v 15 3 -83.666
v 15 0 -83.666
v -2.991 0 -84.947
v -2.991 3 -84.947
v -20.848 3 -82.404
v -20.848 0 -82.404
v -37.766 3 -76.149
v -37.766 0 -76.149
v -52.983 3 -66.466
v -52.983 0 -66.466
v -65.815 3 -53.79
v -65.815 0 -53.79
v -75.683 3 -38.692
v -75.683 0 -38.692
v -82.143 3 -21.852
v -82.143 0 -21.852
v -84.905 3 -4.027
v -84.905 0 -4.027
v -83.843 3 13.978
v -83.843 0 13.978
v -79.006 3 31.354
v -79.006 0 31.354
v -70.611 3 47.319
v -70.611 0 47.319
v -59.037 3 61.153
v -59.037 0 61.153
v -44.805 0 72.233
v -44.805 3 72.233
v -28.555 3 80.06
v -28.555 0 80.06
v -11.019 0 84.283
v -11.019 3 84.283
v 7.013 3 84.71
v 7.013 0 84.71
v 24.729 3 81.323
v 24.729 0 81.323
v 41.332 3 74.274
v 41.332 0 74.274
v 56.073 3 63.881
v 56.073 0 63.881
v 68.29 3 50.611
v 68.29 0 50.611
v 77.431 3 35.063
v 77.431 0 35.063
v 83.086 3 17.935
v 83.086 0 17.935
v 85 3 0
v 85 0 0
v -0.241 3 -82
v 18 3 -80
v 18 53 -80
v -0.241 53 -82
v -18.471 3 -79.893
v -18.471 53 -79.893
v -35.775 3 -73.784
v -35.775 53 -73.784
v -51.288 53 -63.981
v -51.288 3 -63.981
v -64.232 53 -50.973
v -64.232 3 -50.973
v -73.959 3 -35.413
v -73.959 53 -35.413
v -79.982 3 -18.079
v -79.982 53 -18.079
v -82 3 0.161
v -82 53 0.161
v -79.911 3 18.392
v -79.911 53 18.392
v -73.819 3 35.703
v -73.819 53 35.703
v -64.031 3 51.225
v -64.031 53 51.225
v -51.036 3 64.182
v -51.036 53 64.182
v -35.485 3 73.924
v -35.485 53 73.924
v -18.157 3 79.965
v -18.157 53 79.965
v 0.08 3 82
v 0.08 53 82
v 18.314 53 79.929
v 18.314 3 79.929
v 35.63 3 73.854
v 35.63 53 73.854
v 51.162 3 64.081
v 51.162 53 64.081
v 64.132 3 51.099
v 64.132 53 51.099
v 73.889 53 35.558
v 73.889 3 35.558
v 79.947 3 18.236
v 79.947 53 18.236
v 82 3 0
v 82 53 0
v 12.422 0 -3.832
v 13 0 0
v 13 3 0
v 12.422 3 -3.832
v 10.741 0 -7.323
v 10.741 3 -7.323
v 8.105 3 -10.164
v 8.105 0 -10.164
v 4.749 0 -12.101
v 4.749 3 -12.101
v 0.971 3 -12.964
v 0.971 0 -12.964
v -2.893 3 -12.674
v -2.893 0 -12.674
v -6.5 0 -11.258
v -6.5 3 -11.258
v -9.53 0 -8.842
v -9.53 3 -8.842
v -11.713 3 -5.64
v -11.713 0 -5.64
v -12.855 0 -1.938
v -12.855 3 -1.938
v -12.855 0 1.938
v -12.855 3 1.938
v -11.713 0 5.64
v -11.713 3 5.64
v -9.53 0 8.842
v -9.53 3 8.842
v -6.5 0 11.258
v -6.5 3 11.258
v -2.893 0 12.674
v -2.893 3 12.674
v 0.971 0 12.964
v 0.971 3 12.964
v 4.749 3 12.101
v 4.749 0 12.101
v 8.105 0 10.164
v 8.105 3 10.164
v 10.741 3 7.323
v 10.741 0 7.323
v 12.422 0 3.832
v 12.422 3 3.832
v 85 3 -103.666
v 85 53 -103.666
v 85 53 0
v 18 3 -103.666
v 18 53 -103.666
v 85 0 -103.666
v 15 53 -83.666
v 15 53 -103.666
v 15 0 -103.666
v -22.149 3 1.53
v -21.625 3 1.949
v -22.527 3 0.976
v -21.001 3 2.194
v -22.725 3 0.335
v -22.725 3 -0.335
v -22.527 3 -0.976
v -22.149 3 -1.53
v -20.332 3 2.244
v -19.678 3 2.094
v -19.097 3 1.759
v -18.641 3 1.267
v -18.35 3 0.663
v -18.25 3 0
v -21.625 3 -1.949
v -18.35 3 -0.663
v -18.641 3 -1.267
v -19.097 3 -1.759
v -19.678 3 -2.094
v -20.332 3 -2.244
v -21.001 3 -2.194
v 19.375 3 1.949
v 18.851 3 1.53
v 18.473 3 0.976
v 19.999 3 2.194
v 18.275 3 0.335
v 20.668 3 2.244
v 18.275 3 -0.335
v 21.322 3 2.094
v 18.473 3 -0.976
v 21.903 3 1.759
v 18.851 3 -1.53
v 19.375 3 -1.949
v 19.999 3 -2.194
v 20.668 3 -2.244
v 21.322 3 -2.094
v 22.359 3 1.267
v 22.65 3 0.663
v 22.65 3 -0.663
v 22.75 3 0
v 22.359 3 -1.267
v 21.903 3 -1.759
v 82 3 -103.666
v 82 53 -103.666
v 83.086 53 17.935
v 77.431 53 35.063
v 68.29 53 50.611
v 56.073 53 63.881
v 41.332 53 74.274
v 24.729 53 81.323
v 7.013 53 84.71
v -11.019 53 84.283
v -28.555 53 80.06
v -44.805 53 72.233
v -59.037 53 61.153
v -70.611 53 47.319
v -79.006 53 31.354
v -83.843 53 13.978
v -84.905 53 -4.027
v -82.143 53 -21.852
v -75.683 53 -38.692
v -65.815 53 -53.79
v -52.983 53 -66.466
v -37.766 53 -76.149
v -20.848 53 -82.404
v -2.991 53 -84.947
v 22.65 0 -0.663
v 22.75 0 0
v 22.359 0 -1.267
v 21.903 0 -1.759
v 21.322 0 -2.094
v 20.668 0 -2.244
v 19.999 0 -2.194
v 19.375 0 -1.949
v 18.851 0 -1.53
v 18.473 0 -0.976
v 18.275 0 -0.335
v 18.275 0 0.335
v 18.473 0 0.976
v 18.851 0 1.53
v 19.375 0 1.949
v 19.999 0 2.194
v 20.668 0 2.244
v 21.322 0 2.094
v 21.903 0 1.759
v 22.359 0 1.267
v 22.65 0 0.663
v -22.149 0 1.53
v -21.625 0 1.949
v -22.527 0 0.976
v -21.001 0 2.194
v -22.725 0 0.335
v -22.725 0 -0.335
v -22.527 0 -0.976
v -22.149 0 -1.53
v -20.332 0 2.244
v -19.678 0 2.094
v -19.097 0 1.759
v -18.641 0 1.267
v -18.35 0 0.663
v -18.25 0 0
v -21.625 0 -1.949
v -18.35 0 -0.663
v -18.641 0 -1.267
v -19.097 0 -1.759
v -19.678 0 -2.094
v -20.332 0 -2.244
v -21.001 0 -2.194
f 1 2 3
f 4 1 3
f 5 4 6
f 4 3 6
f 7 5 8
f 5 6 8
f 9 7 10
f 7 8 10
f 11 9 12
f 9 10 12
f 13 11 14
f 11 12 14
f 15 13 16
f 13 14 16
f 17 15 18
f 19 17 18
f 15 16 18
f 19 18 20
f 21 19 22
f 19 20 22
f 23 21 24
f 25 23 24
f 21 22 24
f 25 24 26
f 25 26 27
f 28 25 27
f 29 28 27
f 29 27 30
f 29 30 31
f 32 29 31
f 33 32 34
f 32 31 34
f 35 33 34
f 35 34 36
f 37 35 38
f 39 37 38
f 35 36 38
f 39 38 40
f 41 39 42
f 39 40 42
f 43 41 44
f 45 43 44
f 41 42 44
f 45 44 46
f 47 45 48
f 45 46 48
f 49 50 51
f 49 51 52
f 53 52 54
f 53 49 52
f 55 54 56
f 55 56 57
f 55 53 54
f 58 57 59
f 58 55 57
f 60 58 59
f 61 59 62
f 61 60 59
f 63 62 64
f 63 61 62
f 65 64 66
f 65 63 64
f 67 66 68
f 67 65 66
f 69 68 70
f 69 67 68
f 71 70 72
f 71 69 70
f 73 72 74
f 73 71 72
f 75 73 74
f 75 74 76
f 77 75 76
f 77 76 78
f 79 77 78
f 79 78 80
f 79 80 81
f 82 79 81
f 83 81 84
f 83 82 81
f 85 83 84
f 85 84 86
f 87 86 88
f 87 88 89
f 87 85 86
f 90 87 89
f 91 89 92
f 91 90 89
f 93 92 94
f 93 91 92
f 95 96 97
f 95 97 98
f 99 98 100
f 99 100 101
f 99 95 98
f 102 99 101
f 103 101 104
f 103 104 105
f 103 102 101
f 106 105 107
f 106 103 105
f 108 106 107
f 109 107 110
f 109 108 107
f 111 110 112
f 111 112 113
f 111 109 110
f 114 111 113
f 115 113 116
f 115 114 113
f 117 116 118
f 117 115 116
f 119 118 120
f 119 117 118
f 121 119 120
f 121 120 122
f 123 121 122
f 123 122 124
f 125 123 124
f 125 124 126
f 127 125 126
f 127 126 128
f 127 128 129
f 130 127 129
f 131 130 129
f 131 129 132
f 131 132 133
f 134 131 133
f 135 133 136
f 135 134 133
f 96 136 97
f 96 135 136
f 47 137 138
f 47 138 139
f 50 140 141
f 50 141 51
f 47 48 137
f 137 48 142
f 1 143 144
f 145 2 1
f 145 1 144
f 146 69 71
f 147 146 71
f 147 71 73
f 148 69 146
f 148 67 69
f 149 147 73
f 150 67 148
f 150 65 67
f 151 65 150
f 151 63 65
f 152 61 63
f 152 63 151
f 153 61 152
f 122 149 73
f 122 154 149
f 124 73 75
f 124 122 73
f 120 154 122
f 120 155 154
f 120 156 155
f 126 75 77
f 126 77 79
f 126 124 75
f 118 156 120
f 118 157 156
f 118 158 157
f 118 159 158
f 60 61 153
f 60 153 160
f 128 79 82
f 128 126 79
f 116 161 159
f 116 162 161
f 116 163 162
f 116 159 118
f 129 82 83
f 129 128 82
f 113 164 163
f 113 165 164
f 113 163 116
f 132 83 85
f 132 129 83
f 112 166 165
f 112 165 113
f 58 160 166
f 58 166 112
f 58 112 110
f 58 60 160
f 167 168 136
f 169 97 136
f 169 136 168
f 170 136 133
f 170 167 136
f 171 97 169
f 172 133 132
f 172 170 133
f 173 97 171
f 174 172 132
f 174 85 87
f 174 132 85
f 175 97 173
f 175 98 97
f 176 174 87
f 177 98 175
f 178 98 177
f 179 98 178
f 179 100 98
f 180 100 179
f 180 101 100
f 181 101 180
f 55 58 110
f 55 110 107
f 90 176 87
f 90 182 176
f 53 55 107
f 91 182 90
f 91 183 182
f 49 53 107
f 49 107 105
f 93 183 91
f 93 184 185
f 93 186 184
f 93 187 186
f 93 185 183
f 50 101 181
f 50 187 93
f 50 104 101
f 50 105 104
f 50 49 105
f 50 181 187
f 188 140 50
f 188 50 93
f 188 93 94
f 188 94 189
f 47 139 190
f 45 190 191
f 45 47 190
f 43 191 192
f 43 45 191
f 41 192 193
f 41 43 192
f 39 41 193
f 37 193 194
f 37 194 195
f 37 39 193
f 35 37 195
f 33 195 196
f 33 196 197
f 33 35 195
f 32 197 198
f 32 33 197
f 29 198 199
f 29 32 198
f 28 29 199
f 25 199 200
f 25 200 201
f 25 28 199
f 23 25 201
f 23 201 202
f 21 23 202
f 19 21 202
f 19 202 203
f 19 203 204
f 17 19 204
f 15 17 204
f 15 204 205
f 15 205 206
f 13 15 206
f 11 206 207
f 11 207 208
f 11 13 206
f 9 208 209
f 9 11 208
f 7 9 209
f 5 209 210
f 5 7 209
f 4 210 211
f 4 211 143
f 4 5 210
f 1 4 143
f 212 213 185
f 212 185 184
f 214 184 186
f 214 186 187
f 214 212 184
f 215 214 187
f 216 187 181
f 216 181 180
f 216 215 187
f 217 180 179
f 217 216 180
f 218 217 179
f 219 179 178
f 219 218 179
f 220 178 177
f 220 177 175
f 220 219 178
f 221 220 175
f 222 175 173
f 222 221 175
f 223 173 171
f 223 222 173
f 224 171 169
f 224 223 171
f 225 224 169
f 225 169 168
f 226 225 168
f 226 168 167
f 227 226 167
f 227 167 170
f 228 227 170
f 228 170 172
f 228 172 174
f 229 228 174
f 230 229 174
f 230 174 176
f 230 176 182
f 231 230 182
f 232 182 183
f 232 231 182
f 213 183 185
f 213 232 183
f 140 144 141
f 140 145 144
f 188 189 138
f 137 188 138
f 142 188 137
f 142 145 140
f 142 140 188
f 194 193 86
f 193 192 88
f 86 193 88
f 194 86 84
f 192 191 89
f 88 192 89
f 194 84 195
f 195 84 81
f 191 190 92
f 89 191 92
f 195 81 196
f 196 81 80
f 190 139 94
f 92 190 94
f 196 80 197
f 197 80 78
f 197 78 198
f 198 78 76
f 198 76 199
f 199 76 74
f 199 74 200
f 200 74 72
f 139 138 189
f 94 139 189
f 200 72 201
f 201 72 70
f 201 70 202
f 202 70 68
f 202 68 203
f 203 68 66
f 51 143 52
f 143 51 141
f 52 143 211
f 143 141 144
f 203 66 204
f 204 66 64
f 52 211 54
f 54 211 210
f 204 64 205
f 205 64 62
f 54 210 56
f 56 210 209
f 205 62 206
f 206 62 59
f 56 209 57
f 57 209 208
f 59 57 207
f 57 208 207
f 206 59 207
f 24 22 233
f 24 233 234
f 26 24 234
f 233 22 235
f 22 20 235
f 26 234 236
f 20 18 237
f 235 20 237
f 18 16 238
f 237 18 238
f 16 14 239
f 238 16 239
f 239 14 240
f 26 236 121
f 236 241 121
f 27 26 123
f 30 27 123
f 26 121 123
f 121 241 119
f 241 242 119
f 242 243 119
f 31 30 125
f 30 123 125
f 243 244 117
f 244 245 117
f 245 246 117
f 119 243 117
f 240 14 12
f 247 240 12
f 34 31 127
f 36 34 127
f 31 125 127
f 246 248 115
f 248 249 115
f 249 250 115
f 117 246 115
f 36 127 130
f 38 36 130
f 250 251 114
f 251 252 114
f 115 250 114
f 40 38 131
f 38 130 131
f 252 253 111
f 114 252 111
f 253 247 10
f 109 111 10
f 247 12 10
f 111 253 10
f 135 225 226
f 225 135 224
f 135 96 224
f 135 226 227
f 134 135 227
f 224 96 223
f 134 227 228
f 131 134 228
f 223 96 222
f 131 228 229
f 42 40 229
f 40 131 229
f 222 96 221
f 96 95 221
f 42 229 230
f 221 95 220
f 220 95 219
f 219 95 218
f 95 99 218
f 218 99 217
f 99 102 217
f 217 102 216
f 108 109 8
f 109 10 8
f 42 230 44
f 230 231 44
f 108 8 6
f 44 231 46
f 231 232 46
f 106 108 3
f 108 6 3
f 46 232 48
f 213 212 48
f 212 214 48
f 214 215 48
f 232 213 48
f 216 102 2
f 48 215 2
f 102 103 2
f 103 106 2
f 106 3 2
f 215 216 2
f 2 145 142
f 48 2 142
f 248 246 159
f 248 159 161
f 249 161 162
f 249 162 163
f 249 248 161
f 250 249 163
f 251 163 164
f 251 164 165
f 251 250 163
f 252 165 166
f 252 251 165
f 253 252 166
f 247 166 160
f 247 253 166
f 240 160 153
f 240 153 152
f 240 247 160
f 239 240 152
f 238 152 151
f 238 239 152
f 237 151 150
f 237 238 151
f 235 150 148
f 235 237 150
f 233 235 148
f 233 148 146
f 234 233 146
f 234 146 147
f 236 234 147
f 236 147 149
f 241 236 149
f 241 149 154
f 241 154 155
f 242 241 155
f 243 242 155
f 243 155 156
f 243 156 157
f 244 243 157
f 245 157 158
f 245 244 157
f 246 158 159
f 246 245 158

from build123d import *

# Parameters (mm, degrees)
SKETCH2_R           = 2.25
SKETCH2_R_2         = 13
BOSS_EXTRUDE1_DEPTH = 3
BOSS_EXTRUDE2_DEPTH = 50


with BuildPart() as part:
    # Sketch2 → Boss-Extrude1 (new body)
    with BuildSketch(Plane(origin=(0, 0, 0), x_dir=(1, 0, 0), z_dir=(0, 1, 0))):
        with BuildLine():
            Line((85, 0), (85, 103.666002653))
            Line((85, 103.666002653), (15, 103.666002653))
            Line((15, 103.666002653), (15, 83.666002653))
            ThreePointArc((15, 83.666002653), (-65.192024052, -54.543560573), (85, 0))
        make_face()
        with Locations((20.5, 0)):
            Circle(SKETCH2_R, mode=Mode.SUBTRACT)
        with Locations((-20.5, 0)):
            Circle(SKETCH2_R, mode=Mode.SUBTRACT)
        Circle(SKETCH2_R_2, mode=Mode.SUBTRACT)
    extrude(amount=BOSS_EXTRUDE1_DEPTH)

    # Sketch3 → Boss-Extrude2 (add)
    with BuildSketch(Plane(origin=(0, 3, 0), x_dir=(1, 0, 0), z_dir=(0, 1, 0))):
        with BuildLine():
            Line((15, 103.666002653), (18, 103.666002653))
            Line((18, 103.666002653), (18, 80))
            ThreePointArc((18, 80), (-64.031242374, -51.224993899), (82, 0))
            Line((82, 0), (82, 103.666002653))
            Line((82, 103.666002653), (85, 103.666002653))
            Line((85, 103.666002653), (85, 0))
            ThreePointArc((85, 0), (-65.192024052, -54.543560573), (15, 83.666002653))
            Line((15, 83.666002653), (15, 103.666002653))
        make_face()
    extrude(amount=BOSS_EXTRUDE2_DEPTH)


solid = part.part
